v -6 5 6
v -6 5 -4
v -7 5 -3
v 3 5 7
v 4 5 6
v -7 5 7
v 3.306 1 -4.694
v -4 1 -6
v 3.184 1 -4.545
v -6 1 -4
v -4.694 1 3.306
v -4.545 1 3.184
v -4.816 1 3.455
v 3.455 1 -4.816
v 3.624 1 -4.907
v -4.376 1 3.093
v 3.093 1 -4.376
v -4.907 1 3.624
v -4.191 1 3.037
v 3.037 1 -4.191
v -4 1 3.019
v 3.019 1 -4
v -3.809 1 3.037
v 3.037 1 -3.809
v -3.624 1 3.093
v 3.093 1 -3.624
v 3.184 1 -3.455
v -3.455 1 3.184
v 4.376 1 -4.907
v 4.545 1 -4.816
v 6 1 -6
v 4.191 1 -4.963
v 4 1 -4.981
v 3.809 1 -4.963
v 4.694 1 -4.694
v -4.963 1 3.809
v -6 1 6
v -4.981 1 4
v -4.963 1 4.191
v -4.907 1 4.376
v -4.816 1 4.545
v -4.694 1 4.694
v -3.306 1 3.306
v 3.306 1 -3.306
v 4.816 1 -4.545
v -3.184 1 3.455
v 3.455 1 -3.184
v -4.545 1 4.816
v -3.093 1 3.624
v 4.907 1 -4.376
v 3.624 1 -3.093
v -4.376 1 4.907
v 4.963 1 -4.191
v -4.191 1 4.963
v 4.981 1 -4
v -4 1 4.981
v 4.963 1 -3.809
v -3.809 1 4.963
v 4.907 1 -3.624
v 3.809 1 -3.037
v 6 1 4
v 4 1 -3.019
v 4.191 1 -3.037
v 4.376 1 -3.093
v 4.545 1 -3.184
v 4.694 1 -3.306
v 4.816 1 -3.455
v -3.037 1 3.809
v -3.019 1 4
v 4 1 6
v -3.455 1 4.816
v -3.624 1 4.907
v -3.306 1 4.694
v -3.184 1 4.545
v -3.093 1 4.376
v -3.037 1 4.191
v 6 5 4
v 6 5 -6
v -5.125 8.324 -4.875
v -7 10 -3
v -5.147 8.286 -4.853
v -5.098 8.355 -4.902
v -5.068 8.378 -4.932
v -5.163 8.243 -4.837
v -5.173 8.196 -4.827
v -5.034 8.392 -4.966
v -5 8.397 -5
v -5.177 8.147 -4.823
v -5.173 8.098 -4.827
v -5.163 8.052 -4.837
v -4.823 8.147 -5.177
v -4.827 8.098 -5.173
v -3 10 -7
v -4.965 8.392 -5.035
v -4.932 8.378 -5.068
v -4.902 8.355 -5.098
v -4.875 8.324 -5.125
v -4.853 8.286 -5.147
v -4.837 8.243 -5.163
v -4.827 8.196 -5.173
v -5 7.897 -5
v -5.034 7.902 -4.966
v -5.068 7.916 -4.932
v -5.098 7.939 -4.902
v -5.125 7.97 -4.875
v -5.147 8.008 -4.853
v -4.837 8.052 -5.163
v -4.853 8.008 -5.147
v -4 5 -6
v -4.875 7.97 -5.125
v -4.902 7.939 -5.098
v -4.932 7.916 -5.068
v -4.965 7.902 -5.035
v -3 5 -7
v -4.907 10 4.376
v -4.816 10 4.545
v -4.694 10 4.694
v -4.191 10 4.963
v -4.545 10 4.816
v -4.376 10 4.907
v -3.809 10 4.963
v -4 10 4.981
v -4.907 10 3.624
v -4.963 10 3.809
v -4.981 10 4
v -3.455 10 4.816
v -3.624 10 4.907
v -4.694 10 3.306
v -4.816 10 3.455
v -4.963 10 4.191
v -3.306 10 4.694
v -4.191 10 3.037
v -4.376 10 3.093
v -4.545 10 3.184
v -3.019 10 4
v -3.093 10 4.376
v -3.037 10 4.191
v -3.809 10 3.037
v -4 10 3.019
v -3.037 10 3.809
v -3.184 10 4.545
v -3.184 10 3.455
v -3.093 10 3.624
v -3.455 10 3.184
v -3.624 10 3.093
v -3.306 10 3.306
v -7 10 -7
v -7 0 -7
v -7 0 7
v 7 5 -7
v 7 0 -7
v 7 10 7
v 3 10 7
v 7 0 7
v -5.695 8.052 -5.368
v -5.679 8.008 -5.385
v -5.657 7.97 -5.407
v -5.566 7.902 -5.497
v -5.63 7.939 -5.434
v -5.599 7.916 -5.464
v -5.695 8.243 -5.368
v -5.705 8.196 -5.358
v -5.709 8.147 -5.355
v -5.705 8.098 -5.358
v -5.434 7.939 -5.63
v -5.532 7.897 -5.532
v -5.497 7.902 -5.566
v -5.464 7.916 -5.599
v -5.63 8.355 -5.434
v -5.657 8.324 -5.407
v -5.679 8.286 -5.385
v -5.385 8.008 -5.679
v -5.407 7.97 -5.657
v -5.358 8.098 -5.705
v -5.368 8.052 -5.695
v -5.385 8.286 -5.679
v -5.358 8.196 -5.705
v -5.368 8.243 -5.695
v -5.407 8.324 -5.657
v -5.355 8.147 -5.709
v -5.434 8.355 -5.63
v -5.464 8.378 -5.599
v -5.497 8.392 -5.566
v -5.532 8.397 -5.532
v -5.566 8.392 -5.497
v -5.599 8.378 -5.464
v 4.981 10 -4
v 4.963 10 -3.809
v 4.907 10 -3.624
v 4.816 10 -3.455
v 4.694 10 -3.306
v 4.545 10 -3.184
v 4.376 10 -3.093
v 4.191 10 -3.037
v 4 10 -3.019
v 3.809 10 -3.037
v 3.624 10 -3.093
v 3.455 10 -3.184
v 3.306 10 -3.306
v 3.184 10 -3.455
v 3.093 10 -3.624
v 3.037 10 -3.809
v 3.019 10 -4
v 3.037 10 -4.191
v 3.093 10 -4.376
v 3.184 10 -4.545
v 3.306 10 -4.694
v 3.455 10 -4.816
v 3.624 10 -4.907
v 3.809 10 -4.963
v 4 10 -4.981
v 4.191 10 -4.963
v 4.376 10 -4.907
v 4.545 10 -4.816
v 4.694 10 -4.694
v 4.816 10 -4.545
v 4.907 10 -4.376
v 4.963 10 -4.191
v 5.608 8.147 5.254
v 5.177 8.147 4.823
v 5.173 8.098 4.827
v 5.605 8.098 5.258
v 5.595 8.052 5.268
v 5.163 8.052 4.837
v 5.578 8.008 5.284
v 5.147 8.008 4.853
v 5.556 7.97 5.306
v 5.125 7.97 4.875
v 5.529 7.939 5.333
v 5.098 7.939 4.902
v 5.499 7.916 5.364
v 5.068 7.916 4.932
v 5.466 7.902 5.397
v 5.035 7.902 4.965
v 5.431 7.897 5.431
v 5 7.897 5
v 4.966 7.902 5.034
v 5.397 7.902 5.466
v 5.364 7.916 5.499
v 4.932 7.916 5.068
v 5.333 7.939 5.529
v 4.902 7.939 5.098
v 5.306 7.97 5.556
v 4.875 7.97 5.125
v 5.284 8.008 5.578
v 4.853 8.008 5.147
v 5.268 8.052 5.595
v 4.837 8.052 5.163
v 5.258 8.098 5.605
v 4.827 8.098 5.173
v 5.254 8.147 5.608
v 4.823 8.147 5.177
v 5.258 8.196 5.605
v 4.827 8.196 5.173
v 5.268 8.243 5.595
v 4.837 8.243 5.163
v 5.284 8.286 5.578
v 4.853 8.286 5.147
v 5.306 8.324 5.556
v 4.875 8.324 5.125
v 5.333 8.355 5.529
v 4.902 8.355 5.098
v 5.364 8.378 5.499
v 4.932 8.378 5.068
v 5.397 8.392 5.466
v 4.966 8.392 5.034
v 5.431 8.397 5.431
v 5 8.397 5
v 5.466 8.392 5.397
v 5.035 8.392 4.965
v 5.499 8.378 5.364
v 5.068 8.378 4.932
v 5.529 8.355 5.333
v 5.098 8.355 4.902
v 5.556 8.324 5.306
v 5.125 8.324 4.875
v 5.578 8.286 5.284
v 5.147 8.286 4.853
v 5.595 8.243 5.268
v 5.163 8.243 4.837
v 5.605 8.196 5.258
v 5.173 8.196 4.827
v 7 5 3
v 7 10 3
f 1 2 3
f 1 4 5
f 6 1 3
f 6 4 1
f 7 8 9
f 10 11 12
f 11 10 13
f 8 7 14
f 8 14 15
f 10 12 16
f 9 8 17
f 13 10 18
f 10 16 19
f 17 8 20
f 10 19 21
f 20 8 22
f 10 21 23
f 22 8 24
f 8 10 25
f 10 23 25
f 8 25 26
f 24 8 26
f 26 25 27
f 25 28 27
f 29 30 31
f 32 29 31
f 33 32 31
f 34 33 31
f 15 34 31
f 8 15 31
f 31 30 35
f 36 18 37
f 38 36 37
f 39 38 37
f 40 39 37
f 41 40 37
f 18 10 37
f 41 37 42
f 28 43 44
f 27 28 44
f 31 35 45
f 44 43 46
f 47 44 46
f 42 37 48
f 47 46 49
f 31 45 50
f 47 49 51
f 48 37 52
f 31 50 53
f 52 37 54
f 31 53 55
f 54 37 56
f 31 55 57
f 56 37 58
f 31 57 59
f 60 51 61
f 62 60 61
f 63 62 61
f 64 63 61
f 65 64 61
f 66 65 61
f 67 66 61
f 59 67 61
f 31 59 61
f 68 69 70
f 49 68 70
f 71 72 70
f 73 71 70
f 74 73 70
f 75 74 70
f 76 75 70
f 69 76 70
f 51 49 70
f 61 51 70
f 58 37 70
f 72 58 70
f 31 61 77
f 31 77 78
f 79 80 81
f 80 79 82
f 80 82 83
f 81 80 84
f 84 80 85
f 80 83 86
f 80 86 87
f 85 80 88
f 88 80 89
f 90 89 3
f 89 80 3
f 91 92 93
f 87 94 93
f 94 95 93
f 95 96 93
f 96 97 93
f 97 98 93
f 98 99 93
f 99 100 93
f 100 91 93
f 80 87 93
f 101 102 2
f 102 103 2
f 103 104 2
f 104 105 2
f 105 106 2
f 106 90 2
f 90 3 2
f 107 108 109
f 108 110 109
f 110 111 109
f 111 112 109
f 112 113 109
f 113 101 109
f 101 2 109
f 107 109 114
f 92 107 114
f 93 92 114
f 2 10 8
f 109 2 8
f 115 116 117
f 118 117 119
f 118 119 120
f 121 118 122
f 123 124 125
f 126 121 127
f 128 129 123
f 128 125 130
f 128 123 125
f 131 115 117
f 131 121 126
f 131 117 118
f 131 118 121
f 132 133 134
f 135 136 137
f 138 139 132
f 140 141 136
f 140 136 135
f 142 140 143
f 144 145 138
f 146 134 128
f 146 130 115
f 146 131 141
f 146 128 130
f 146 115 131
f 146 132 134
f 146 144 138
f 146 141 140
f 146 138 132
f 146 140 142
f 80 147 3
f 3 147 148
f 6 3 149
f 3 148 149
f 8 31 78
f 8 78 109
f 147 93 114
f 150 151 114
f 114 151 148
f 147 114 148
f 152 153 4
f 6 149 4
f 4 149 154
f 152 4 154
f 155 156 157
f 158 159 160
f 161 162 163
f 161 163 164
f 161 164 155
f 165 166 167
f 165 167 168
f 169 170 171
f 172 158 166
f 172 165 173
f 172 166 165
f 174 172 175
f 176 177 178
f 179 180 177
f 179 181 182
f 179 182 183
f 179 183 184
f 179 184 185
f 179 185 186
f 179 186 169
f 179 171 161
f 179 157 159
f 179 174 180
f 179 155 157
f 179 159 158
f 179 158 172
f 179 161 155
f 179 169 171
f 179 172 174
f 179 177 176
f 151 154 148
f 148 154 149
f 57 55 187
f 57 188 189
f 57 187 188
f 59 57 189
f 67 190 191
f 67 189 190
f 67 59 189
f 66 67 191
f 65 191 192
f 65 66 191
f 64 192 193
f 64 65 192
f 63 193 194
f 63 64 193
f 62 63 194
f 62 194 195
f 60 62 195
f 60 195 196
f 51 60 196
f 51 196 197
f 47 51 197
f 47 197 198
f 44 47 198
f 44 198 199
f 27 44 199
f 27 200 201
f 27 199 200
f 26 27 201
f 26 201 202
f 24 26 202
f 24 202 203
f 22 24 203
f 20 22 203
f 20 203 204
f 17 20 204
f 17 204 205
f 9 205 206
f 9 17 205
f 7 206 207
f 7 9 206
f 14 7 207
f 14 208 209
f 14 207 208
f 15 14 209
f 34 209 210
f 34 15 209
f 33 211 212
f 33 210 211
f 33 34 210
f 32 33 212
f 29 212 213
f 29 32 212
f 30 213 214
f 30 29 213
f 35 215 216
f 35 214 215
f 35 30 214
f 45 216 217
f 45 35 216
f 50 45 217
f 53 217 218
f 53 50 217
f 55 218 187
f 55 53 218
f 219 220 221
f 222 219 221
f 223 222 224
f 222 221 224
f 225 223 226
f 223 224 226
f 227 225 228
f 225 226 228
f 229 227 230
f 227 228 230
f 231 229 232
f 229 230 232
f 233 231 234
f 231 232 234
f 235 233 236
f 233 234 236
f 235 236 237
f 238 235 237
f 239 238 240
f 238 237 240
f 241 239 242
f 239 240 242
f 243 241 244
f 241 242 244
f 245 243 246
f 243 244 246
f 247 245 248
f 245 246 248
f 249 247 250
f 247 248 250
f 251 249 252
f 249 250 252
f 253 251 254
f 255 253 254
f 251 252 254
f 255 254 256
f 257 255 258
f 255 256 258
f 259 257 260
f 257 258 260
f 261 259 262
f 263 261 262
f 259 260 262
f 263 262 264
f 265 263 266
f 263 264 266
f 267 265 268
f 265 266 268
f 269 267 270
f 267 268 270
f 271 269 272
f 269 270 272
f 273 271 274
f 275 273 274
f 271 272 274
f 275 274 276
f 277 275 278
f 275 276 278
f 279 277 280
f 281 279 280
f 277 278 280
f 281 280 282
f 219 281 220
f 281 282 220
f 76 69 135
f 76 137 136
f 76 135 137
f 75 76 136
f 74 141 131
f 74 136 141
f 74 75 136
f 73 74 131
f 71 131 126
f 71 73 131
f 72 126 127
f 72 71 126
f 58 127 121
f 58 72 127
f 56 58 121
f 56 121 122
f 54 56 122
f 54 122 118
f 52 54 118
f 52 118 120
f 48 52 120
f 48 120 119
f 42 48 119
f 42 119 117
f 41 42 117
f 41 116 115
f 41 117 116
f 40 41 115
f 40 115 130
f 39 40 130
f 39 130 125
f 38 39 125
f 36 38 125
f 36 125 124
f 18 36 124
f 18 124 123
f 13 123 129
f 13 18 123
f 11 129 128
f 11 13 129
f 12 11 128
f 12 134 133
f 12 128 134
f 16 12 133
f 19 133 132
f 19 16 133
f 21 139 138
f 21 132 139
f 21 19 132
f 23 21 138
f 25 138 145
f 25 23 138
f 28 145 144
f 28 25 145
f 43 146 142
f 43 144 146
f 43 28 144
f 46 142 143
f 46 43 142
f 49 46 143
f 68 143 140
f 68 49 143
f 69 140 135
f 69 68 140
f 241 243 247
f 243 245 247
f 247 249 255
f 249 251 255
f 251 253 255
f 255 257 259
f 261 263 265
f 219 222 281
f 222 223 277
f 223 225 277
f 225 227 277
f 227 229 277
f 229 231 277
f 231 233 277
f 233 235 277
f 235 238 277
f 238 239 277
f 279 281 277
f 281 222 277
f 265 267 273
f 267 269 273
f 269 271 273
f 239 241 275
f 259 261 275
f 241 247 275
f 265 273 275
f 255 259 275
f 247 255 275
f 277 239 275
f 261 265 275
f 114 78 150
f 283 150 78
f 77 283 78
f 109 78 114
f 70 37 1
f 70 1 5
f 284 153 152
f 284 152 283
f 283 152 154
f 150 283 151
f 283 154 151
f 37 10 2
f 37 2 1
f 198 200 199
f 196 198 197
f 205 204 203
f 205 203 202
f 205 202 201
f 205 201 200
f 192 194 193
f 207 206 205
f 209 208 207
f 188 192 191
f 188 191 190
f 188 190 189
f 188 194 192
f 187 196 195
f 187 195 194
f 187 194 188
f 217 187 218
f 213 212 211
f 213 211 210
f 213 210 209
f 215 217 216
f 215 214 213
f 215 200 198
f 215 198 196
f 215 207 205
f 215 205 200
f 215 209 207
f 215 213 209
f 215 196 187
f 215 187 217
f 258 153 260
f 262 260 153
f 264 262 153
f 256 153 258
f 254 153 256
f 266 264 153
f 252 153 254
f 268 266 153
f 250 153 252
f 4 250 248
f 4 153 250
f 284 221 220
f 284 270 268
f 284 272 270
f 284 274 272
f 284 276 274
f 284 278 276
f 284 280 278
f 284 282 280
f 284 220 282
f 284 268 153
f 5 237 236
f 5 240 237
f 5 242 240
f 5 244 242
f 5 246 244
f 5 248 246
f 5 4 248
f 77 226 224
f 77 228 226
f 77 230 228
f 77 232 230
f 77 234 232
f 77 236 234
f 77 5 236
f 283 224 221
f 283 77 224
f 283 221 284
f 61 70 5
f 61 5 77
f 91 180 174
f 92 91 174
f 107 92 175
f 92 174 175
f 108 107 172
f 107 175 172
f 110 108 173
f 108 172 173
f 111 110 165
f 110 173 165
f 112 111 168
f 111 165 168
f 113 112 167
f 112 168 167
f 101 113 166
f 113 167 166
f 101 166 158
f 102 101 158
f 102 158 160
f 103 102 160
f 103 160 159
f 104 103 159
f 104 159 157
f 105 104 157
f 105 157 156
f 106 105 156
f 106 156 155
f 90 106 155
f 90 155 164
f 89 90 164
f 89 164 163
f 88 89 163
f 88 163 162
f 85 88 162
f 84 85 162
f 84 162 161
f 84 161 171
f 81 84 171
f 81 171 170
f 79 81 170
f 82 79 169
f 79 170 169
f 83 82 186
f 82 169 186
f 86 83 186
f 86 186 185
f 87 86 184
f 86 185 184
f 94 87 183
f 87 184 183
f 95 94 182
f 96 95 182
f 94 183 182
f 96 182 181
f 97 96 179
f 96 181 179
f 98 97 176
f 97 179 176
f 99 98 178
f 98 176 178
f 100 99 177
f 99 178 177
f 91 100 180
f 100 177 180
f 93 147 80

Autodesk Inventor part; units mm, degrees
ref_plane "YZ Plane" through (0, 0, 0) normal (1, 0, 0) x (0, 1, 0)
ref_plane "XZ Plane" through (0, 0, 0) normal (0, 1, 0) x (-1, 0, 0)
ref_plane "XY Plane" through (0, 0, 0) normal (0, 0, 1) x (1, 0, 0)
sketch "Sketch1" plane through (0, 0, 0) normal (0, 1, 0) x (-1, 0, 0)
  line L0 (7, 7) -> (-7, 7)
  line L1 (-7, 7) -> (-7, -7)
  line L2 (-7, -7) -> (7, -7)
  line L3 (7, -7) -> (7, 7)
  line L4 (7, 7) -> (-7, -7) construction
  line L5 (-7, 7) -> (7, -7) construction
  line L6 (6, 6) -> (-6, 6)
  line L7 (-6, 6) -> (-6, -6)
  line L8 (-6, -6) -> (6, -6)
  line L9 (6, -6) -> (6, 6)
  point P0 (0, 0)
  dimension "d0" = 14
  dimension "d1" = 14
  dimension "d2" = 1
extrude "Extrusion1" add sketch "Sketch1" along normal blind 5
sketch "Sketch2" plane through (0, 5, 0) normal (0, 1, 0) x (1, 0, 0)
  line L0 (-7, -7) -> (7, -7) projected
  line L1 (3, -7) -> (7, -3)
  line L2 (7, -7) -> (7, 7) projected
  line L3 (-7, 7) -> (-7, -7) projected
  line L4 (-7, 3) -> (-3, 7)
  line L5 (7, 7) -> (-7, 7) projected
  point P0 (0, 0)
  dimension "d5" = 4
  dimension "d6" = 4
  dimension "d7" = 4
  dimension "d8" = 4
extrude "Extrusion2" add sketch "Sketch2" along normal mid plane 10 contours L1 L2 L0 | L3 L5 L4
sketch "Sketch3" plane through (0, 0, 0) normal (0, -1, 0) x (1, 0, 0)
  line L0 (7, -7) -> (-7, -7) projected
  line L1 (7, 7) -> (7, -7) projected
  line L2 (-7, 7) -> (7, 7) projected
  line L3 (-7, -7) -> (-7, 7) projected
  line L4 (-4, -6) -> (-6, -4) projected
  line L5 (-6, 6) -> (-6, -4) projected
  line L6 (4, 6) -> (-6, 6) projected
  line L7 (4, 6) -> (6, 4) projected
  line L8 (6, -6) -> (6, 4) projected
  line L9 (-4, -6) -> (6, -6) projected
  point P0 (0, 0)
extrude "Extrusion3" add sketch "Sketch3" against normal blind 1 contours L0 L3 L2 L1 | L4 L5 L6 L7 L8 L9
sketch "Sketch4" plane through (0, 1, 0) normal (0, 1, 0) x (1, 0, 0)
  circle A0 centre (-4, -4) radius 0.9814
  circle A1 centre (4, 4) radius 0.9814
  line L0 (-6, -6) -> (-6, 4) projected
  line L1 (4, -6) -> (-6, -6) projected
  line L2 (-4, 6) -> (6, 6) projected
  line L3 (6, 6) -> (6, -4) projected
  point P0 (0, 0)
  dimension "d15" = 2
  dimension "d16" = 2
  dimension "d17" = 2
  dimension "d18" = 2
extrude "Extrusion4" add sketch "Sketch4" along normal blind 9
sketch "Sketch5" plane through (-3, 5, -7) normal (0.7071, 0, 0.7071) x (0.7071, 0, -0.7071)
  line L0 (-2.8284, -5) -> (-2.8284, 5) projected
  circle A0 centre (-2.8284, 3.1472) radius 0.25
  dimension "d19" = 0.5
extrude "Extrusion5" cut sketch "Sketch5" along normal blind 14.75 and the other way blind 0.75
properties part number "disk holder" material "ABS Plastic"
